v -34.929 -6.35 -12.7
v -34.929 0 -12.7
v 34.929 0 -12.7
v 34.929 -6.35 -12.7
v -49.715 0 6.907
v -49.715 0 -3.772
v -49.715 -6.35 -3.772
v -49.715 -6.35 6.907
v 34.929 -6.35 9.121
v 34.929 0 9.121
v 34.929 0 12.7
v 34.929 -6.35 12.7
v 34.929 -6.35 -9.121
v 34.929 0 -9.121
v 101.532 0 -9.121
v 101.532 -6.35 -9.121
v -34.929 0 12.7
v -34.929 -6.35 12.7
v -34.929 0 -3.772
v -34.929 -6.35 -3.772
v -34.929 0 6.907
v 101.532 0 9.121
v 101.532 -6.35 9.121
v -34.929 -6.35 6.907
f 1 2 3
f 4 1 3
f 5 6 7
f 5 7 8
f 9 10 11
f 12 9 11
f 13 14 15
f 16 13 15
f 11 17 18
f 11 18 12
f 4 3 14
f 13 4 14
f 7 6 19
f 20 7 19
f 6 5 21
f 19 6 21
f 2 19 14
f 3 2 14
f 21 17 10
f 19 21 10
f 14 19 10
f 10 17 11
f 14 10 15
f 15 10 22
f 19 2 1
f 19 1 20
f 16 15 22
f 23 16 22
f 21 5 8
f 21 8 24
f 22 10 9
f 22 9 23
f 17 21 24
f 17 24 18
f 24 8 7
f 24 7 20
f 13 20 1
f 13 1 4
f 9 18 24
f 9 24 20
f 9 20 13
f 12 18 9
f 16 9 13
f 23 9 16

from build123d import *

# Parameters (mm, degrees)
F0_W     = 69.857972
F0_H     = 25.4
F1_DEPTH = 6.35
F2_W     = 15.100554
F2_H     = 10.679496
F2_W_2   = 114.3
F2_H_2   = 18.241366
F3_DEPTH = 6.35


with BuildPart() as f1:
    # F0 (on Front) → F1 (new body)
    with BuildSketch(Plane.XZ):
        Rectangle(F0_W, F0_H)
    extrude(amount=F1_DEPTH)

    # F2 (on Front) → F3 (join)
    with BuildSketch(Plane.XZ):
        with Locations((-42.164538, 1.567621)):
            Rectangle(F2_W, F2_H)
        with Locations((44.382397, 0)):
            Rectangle(F2_W_2, F2_H_2)
    extrude(amount=F3_DEPTH)


solid = f1.part
